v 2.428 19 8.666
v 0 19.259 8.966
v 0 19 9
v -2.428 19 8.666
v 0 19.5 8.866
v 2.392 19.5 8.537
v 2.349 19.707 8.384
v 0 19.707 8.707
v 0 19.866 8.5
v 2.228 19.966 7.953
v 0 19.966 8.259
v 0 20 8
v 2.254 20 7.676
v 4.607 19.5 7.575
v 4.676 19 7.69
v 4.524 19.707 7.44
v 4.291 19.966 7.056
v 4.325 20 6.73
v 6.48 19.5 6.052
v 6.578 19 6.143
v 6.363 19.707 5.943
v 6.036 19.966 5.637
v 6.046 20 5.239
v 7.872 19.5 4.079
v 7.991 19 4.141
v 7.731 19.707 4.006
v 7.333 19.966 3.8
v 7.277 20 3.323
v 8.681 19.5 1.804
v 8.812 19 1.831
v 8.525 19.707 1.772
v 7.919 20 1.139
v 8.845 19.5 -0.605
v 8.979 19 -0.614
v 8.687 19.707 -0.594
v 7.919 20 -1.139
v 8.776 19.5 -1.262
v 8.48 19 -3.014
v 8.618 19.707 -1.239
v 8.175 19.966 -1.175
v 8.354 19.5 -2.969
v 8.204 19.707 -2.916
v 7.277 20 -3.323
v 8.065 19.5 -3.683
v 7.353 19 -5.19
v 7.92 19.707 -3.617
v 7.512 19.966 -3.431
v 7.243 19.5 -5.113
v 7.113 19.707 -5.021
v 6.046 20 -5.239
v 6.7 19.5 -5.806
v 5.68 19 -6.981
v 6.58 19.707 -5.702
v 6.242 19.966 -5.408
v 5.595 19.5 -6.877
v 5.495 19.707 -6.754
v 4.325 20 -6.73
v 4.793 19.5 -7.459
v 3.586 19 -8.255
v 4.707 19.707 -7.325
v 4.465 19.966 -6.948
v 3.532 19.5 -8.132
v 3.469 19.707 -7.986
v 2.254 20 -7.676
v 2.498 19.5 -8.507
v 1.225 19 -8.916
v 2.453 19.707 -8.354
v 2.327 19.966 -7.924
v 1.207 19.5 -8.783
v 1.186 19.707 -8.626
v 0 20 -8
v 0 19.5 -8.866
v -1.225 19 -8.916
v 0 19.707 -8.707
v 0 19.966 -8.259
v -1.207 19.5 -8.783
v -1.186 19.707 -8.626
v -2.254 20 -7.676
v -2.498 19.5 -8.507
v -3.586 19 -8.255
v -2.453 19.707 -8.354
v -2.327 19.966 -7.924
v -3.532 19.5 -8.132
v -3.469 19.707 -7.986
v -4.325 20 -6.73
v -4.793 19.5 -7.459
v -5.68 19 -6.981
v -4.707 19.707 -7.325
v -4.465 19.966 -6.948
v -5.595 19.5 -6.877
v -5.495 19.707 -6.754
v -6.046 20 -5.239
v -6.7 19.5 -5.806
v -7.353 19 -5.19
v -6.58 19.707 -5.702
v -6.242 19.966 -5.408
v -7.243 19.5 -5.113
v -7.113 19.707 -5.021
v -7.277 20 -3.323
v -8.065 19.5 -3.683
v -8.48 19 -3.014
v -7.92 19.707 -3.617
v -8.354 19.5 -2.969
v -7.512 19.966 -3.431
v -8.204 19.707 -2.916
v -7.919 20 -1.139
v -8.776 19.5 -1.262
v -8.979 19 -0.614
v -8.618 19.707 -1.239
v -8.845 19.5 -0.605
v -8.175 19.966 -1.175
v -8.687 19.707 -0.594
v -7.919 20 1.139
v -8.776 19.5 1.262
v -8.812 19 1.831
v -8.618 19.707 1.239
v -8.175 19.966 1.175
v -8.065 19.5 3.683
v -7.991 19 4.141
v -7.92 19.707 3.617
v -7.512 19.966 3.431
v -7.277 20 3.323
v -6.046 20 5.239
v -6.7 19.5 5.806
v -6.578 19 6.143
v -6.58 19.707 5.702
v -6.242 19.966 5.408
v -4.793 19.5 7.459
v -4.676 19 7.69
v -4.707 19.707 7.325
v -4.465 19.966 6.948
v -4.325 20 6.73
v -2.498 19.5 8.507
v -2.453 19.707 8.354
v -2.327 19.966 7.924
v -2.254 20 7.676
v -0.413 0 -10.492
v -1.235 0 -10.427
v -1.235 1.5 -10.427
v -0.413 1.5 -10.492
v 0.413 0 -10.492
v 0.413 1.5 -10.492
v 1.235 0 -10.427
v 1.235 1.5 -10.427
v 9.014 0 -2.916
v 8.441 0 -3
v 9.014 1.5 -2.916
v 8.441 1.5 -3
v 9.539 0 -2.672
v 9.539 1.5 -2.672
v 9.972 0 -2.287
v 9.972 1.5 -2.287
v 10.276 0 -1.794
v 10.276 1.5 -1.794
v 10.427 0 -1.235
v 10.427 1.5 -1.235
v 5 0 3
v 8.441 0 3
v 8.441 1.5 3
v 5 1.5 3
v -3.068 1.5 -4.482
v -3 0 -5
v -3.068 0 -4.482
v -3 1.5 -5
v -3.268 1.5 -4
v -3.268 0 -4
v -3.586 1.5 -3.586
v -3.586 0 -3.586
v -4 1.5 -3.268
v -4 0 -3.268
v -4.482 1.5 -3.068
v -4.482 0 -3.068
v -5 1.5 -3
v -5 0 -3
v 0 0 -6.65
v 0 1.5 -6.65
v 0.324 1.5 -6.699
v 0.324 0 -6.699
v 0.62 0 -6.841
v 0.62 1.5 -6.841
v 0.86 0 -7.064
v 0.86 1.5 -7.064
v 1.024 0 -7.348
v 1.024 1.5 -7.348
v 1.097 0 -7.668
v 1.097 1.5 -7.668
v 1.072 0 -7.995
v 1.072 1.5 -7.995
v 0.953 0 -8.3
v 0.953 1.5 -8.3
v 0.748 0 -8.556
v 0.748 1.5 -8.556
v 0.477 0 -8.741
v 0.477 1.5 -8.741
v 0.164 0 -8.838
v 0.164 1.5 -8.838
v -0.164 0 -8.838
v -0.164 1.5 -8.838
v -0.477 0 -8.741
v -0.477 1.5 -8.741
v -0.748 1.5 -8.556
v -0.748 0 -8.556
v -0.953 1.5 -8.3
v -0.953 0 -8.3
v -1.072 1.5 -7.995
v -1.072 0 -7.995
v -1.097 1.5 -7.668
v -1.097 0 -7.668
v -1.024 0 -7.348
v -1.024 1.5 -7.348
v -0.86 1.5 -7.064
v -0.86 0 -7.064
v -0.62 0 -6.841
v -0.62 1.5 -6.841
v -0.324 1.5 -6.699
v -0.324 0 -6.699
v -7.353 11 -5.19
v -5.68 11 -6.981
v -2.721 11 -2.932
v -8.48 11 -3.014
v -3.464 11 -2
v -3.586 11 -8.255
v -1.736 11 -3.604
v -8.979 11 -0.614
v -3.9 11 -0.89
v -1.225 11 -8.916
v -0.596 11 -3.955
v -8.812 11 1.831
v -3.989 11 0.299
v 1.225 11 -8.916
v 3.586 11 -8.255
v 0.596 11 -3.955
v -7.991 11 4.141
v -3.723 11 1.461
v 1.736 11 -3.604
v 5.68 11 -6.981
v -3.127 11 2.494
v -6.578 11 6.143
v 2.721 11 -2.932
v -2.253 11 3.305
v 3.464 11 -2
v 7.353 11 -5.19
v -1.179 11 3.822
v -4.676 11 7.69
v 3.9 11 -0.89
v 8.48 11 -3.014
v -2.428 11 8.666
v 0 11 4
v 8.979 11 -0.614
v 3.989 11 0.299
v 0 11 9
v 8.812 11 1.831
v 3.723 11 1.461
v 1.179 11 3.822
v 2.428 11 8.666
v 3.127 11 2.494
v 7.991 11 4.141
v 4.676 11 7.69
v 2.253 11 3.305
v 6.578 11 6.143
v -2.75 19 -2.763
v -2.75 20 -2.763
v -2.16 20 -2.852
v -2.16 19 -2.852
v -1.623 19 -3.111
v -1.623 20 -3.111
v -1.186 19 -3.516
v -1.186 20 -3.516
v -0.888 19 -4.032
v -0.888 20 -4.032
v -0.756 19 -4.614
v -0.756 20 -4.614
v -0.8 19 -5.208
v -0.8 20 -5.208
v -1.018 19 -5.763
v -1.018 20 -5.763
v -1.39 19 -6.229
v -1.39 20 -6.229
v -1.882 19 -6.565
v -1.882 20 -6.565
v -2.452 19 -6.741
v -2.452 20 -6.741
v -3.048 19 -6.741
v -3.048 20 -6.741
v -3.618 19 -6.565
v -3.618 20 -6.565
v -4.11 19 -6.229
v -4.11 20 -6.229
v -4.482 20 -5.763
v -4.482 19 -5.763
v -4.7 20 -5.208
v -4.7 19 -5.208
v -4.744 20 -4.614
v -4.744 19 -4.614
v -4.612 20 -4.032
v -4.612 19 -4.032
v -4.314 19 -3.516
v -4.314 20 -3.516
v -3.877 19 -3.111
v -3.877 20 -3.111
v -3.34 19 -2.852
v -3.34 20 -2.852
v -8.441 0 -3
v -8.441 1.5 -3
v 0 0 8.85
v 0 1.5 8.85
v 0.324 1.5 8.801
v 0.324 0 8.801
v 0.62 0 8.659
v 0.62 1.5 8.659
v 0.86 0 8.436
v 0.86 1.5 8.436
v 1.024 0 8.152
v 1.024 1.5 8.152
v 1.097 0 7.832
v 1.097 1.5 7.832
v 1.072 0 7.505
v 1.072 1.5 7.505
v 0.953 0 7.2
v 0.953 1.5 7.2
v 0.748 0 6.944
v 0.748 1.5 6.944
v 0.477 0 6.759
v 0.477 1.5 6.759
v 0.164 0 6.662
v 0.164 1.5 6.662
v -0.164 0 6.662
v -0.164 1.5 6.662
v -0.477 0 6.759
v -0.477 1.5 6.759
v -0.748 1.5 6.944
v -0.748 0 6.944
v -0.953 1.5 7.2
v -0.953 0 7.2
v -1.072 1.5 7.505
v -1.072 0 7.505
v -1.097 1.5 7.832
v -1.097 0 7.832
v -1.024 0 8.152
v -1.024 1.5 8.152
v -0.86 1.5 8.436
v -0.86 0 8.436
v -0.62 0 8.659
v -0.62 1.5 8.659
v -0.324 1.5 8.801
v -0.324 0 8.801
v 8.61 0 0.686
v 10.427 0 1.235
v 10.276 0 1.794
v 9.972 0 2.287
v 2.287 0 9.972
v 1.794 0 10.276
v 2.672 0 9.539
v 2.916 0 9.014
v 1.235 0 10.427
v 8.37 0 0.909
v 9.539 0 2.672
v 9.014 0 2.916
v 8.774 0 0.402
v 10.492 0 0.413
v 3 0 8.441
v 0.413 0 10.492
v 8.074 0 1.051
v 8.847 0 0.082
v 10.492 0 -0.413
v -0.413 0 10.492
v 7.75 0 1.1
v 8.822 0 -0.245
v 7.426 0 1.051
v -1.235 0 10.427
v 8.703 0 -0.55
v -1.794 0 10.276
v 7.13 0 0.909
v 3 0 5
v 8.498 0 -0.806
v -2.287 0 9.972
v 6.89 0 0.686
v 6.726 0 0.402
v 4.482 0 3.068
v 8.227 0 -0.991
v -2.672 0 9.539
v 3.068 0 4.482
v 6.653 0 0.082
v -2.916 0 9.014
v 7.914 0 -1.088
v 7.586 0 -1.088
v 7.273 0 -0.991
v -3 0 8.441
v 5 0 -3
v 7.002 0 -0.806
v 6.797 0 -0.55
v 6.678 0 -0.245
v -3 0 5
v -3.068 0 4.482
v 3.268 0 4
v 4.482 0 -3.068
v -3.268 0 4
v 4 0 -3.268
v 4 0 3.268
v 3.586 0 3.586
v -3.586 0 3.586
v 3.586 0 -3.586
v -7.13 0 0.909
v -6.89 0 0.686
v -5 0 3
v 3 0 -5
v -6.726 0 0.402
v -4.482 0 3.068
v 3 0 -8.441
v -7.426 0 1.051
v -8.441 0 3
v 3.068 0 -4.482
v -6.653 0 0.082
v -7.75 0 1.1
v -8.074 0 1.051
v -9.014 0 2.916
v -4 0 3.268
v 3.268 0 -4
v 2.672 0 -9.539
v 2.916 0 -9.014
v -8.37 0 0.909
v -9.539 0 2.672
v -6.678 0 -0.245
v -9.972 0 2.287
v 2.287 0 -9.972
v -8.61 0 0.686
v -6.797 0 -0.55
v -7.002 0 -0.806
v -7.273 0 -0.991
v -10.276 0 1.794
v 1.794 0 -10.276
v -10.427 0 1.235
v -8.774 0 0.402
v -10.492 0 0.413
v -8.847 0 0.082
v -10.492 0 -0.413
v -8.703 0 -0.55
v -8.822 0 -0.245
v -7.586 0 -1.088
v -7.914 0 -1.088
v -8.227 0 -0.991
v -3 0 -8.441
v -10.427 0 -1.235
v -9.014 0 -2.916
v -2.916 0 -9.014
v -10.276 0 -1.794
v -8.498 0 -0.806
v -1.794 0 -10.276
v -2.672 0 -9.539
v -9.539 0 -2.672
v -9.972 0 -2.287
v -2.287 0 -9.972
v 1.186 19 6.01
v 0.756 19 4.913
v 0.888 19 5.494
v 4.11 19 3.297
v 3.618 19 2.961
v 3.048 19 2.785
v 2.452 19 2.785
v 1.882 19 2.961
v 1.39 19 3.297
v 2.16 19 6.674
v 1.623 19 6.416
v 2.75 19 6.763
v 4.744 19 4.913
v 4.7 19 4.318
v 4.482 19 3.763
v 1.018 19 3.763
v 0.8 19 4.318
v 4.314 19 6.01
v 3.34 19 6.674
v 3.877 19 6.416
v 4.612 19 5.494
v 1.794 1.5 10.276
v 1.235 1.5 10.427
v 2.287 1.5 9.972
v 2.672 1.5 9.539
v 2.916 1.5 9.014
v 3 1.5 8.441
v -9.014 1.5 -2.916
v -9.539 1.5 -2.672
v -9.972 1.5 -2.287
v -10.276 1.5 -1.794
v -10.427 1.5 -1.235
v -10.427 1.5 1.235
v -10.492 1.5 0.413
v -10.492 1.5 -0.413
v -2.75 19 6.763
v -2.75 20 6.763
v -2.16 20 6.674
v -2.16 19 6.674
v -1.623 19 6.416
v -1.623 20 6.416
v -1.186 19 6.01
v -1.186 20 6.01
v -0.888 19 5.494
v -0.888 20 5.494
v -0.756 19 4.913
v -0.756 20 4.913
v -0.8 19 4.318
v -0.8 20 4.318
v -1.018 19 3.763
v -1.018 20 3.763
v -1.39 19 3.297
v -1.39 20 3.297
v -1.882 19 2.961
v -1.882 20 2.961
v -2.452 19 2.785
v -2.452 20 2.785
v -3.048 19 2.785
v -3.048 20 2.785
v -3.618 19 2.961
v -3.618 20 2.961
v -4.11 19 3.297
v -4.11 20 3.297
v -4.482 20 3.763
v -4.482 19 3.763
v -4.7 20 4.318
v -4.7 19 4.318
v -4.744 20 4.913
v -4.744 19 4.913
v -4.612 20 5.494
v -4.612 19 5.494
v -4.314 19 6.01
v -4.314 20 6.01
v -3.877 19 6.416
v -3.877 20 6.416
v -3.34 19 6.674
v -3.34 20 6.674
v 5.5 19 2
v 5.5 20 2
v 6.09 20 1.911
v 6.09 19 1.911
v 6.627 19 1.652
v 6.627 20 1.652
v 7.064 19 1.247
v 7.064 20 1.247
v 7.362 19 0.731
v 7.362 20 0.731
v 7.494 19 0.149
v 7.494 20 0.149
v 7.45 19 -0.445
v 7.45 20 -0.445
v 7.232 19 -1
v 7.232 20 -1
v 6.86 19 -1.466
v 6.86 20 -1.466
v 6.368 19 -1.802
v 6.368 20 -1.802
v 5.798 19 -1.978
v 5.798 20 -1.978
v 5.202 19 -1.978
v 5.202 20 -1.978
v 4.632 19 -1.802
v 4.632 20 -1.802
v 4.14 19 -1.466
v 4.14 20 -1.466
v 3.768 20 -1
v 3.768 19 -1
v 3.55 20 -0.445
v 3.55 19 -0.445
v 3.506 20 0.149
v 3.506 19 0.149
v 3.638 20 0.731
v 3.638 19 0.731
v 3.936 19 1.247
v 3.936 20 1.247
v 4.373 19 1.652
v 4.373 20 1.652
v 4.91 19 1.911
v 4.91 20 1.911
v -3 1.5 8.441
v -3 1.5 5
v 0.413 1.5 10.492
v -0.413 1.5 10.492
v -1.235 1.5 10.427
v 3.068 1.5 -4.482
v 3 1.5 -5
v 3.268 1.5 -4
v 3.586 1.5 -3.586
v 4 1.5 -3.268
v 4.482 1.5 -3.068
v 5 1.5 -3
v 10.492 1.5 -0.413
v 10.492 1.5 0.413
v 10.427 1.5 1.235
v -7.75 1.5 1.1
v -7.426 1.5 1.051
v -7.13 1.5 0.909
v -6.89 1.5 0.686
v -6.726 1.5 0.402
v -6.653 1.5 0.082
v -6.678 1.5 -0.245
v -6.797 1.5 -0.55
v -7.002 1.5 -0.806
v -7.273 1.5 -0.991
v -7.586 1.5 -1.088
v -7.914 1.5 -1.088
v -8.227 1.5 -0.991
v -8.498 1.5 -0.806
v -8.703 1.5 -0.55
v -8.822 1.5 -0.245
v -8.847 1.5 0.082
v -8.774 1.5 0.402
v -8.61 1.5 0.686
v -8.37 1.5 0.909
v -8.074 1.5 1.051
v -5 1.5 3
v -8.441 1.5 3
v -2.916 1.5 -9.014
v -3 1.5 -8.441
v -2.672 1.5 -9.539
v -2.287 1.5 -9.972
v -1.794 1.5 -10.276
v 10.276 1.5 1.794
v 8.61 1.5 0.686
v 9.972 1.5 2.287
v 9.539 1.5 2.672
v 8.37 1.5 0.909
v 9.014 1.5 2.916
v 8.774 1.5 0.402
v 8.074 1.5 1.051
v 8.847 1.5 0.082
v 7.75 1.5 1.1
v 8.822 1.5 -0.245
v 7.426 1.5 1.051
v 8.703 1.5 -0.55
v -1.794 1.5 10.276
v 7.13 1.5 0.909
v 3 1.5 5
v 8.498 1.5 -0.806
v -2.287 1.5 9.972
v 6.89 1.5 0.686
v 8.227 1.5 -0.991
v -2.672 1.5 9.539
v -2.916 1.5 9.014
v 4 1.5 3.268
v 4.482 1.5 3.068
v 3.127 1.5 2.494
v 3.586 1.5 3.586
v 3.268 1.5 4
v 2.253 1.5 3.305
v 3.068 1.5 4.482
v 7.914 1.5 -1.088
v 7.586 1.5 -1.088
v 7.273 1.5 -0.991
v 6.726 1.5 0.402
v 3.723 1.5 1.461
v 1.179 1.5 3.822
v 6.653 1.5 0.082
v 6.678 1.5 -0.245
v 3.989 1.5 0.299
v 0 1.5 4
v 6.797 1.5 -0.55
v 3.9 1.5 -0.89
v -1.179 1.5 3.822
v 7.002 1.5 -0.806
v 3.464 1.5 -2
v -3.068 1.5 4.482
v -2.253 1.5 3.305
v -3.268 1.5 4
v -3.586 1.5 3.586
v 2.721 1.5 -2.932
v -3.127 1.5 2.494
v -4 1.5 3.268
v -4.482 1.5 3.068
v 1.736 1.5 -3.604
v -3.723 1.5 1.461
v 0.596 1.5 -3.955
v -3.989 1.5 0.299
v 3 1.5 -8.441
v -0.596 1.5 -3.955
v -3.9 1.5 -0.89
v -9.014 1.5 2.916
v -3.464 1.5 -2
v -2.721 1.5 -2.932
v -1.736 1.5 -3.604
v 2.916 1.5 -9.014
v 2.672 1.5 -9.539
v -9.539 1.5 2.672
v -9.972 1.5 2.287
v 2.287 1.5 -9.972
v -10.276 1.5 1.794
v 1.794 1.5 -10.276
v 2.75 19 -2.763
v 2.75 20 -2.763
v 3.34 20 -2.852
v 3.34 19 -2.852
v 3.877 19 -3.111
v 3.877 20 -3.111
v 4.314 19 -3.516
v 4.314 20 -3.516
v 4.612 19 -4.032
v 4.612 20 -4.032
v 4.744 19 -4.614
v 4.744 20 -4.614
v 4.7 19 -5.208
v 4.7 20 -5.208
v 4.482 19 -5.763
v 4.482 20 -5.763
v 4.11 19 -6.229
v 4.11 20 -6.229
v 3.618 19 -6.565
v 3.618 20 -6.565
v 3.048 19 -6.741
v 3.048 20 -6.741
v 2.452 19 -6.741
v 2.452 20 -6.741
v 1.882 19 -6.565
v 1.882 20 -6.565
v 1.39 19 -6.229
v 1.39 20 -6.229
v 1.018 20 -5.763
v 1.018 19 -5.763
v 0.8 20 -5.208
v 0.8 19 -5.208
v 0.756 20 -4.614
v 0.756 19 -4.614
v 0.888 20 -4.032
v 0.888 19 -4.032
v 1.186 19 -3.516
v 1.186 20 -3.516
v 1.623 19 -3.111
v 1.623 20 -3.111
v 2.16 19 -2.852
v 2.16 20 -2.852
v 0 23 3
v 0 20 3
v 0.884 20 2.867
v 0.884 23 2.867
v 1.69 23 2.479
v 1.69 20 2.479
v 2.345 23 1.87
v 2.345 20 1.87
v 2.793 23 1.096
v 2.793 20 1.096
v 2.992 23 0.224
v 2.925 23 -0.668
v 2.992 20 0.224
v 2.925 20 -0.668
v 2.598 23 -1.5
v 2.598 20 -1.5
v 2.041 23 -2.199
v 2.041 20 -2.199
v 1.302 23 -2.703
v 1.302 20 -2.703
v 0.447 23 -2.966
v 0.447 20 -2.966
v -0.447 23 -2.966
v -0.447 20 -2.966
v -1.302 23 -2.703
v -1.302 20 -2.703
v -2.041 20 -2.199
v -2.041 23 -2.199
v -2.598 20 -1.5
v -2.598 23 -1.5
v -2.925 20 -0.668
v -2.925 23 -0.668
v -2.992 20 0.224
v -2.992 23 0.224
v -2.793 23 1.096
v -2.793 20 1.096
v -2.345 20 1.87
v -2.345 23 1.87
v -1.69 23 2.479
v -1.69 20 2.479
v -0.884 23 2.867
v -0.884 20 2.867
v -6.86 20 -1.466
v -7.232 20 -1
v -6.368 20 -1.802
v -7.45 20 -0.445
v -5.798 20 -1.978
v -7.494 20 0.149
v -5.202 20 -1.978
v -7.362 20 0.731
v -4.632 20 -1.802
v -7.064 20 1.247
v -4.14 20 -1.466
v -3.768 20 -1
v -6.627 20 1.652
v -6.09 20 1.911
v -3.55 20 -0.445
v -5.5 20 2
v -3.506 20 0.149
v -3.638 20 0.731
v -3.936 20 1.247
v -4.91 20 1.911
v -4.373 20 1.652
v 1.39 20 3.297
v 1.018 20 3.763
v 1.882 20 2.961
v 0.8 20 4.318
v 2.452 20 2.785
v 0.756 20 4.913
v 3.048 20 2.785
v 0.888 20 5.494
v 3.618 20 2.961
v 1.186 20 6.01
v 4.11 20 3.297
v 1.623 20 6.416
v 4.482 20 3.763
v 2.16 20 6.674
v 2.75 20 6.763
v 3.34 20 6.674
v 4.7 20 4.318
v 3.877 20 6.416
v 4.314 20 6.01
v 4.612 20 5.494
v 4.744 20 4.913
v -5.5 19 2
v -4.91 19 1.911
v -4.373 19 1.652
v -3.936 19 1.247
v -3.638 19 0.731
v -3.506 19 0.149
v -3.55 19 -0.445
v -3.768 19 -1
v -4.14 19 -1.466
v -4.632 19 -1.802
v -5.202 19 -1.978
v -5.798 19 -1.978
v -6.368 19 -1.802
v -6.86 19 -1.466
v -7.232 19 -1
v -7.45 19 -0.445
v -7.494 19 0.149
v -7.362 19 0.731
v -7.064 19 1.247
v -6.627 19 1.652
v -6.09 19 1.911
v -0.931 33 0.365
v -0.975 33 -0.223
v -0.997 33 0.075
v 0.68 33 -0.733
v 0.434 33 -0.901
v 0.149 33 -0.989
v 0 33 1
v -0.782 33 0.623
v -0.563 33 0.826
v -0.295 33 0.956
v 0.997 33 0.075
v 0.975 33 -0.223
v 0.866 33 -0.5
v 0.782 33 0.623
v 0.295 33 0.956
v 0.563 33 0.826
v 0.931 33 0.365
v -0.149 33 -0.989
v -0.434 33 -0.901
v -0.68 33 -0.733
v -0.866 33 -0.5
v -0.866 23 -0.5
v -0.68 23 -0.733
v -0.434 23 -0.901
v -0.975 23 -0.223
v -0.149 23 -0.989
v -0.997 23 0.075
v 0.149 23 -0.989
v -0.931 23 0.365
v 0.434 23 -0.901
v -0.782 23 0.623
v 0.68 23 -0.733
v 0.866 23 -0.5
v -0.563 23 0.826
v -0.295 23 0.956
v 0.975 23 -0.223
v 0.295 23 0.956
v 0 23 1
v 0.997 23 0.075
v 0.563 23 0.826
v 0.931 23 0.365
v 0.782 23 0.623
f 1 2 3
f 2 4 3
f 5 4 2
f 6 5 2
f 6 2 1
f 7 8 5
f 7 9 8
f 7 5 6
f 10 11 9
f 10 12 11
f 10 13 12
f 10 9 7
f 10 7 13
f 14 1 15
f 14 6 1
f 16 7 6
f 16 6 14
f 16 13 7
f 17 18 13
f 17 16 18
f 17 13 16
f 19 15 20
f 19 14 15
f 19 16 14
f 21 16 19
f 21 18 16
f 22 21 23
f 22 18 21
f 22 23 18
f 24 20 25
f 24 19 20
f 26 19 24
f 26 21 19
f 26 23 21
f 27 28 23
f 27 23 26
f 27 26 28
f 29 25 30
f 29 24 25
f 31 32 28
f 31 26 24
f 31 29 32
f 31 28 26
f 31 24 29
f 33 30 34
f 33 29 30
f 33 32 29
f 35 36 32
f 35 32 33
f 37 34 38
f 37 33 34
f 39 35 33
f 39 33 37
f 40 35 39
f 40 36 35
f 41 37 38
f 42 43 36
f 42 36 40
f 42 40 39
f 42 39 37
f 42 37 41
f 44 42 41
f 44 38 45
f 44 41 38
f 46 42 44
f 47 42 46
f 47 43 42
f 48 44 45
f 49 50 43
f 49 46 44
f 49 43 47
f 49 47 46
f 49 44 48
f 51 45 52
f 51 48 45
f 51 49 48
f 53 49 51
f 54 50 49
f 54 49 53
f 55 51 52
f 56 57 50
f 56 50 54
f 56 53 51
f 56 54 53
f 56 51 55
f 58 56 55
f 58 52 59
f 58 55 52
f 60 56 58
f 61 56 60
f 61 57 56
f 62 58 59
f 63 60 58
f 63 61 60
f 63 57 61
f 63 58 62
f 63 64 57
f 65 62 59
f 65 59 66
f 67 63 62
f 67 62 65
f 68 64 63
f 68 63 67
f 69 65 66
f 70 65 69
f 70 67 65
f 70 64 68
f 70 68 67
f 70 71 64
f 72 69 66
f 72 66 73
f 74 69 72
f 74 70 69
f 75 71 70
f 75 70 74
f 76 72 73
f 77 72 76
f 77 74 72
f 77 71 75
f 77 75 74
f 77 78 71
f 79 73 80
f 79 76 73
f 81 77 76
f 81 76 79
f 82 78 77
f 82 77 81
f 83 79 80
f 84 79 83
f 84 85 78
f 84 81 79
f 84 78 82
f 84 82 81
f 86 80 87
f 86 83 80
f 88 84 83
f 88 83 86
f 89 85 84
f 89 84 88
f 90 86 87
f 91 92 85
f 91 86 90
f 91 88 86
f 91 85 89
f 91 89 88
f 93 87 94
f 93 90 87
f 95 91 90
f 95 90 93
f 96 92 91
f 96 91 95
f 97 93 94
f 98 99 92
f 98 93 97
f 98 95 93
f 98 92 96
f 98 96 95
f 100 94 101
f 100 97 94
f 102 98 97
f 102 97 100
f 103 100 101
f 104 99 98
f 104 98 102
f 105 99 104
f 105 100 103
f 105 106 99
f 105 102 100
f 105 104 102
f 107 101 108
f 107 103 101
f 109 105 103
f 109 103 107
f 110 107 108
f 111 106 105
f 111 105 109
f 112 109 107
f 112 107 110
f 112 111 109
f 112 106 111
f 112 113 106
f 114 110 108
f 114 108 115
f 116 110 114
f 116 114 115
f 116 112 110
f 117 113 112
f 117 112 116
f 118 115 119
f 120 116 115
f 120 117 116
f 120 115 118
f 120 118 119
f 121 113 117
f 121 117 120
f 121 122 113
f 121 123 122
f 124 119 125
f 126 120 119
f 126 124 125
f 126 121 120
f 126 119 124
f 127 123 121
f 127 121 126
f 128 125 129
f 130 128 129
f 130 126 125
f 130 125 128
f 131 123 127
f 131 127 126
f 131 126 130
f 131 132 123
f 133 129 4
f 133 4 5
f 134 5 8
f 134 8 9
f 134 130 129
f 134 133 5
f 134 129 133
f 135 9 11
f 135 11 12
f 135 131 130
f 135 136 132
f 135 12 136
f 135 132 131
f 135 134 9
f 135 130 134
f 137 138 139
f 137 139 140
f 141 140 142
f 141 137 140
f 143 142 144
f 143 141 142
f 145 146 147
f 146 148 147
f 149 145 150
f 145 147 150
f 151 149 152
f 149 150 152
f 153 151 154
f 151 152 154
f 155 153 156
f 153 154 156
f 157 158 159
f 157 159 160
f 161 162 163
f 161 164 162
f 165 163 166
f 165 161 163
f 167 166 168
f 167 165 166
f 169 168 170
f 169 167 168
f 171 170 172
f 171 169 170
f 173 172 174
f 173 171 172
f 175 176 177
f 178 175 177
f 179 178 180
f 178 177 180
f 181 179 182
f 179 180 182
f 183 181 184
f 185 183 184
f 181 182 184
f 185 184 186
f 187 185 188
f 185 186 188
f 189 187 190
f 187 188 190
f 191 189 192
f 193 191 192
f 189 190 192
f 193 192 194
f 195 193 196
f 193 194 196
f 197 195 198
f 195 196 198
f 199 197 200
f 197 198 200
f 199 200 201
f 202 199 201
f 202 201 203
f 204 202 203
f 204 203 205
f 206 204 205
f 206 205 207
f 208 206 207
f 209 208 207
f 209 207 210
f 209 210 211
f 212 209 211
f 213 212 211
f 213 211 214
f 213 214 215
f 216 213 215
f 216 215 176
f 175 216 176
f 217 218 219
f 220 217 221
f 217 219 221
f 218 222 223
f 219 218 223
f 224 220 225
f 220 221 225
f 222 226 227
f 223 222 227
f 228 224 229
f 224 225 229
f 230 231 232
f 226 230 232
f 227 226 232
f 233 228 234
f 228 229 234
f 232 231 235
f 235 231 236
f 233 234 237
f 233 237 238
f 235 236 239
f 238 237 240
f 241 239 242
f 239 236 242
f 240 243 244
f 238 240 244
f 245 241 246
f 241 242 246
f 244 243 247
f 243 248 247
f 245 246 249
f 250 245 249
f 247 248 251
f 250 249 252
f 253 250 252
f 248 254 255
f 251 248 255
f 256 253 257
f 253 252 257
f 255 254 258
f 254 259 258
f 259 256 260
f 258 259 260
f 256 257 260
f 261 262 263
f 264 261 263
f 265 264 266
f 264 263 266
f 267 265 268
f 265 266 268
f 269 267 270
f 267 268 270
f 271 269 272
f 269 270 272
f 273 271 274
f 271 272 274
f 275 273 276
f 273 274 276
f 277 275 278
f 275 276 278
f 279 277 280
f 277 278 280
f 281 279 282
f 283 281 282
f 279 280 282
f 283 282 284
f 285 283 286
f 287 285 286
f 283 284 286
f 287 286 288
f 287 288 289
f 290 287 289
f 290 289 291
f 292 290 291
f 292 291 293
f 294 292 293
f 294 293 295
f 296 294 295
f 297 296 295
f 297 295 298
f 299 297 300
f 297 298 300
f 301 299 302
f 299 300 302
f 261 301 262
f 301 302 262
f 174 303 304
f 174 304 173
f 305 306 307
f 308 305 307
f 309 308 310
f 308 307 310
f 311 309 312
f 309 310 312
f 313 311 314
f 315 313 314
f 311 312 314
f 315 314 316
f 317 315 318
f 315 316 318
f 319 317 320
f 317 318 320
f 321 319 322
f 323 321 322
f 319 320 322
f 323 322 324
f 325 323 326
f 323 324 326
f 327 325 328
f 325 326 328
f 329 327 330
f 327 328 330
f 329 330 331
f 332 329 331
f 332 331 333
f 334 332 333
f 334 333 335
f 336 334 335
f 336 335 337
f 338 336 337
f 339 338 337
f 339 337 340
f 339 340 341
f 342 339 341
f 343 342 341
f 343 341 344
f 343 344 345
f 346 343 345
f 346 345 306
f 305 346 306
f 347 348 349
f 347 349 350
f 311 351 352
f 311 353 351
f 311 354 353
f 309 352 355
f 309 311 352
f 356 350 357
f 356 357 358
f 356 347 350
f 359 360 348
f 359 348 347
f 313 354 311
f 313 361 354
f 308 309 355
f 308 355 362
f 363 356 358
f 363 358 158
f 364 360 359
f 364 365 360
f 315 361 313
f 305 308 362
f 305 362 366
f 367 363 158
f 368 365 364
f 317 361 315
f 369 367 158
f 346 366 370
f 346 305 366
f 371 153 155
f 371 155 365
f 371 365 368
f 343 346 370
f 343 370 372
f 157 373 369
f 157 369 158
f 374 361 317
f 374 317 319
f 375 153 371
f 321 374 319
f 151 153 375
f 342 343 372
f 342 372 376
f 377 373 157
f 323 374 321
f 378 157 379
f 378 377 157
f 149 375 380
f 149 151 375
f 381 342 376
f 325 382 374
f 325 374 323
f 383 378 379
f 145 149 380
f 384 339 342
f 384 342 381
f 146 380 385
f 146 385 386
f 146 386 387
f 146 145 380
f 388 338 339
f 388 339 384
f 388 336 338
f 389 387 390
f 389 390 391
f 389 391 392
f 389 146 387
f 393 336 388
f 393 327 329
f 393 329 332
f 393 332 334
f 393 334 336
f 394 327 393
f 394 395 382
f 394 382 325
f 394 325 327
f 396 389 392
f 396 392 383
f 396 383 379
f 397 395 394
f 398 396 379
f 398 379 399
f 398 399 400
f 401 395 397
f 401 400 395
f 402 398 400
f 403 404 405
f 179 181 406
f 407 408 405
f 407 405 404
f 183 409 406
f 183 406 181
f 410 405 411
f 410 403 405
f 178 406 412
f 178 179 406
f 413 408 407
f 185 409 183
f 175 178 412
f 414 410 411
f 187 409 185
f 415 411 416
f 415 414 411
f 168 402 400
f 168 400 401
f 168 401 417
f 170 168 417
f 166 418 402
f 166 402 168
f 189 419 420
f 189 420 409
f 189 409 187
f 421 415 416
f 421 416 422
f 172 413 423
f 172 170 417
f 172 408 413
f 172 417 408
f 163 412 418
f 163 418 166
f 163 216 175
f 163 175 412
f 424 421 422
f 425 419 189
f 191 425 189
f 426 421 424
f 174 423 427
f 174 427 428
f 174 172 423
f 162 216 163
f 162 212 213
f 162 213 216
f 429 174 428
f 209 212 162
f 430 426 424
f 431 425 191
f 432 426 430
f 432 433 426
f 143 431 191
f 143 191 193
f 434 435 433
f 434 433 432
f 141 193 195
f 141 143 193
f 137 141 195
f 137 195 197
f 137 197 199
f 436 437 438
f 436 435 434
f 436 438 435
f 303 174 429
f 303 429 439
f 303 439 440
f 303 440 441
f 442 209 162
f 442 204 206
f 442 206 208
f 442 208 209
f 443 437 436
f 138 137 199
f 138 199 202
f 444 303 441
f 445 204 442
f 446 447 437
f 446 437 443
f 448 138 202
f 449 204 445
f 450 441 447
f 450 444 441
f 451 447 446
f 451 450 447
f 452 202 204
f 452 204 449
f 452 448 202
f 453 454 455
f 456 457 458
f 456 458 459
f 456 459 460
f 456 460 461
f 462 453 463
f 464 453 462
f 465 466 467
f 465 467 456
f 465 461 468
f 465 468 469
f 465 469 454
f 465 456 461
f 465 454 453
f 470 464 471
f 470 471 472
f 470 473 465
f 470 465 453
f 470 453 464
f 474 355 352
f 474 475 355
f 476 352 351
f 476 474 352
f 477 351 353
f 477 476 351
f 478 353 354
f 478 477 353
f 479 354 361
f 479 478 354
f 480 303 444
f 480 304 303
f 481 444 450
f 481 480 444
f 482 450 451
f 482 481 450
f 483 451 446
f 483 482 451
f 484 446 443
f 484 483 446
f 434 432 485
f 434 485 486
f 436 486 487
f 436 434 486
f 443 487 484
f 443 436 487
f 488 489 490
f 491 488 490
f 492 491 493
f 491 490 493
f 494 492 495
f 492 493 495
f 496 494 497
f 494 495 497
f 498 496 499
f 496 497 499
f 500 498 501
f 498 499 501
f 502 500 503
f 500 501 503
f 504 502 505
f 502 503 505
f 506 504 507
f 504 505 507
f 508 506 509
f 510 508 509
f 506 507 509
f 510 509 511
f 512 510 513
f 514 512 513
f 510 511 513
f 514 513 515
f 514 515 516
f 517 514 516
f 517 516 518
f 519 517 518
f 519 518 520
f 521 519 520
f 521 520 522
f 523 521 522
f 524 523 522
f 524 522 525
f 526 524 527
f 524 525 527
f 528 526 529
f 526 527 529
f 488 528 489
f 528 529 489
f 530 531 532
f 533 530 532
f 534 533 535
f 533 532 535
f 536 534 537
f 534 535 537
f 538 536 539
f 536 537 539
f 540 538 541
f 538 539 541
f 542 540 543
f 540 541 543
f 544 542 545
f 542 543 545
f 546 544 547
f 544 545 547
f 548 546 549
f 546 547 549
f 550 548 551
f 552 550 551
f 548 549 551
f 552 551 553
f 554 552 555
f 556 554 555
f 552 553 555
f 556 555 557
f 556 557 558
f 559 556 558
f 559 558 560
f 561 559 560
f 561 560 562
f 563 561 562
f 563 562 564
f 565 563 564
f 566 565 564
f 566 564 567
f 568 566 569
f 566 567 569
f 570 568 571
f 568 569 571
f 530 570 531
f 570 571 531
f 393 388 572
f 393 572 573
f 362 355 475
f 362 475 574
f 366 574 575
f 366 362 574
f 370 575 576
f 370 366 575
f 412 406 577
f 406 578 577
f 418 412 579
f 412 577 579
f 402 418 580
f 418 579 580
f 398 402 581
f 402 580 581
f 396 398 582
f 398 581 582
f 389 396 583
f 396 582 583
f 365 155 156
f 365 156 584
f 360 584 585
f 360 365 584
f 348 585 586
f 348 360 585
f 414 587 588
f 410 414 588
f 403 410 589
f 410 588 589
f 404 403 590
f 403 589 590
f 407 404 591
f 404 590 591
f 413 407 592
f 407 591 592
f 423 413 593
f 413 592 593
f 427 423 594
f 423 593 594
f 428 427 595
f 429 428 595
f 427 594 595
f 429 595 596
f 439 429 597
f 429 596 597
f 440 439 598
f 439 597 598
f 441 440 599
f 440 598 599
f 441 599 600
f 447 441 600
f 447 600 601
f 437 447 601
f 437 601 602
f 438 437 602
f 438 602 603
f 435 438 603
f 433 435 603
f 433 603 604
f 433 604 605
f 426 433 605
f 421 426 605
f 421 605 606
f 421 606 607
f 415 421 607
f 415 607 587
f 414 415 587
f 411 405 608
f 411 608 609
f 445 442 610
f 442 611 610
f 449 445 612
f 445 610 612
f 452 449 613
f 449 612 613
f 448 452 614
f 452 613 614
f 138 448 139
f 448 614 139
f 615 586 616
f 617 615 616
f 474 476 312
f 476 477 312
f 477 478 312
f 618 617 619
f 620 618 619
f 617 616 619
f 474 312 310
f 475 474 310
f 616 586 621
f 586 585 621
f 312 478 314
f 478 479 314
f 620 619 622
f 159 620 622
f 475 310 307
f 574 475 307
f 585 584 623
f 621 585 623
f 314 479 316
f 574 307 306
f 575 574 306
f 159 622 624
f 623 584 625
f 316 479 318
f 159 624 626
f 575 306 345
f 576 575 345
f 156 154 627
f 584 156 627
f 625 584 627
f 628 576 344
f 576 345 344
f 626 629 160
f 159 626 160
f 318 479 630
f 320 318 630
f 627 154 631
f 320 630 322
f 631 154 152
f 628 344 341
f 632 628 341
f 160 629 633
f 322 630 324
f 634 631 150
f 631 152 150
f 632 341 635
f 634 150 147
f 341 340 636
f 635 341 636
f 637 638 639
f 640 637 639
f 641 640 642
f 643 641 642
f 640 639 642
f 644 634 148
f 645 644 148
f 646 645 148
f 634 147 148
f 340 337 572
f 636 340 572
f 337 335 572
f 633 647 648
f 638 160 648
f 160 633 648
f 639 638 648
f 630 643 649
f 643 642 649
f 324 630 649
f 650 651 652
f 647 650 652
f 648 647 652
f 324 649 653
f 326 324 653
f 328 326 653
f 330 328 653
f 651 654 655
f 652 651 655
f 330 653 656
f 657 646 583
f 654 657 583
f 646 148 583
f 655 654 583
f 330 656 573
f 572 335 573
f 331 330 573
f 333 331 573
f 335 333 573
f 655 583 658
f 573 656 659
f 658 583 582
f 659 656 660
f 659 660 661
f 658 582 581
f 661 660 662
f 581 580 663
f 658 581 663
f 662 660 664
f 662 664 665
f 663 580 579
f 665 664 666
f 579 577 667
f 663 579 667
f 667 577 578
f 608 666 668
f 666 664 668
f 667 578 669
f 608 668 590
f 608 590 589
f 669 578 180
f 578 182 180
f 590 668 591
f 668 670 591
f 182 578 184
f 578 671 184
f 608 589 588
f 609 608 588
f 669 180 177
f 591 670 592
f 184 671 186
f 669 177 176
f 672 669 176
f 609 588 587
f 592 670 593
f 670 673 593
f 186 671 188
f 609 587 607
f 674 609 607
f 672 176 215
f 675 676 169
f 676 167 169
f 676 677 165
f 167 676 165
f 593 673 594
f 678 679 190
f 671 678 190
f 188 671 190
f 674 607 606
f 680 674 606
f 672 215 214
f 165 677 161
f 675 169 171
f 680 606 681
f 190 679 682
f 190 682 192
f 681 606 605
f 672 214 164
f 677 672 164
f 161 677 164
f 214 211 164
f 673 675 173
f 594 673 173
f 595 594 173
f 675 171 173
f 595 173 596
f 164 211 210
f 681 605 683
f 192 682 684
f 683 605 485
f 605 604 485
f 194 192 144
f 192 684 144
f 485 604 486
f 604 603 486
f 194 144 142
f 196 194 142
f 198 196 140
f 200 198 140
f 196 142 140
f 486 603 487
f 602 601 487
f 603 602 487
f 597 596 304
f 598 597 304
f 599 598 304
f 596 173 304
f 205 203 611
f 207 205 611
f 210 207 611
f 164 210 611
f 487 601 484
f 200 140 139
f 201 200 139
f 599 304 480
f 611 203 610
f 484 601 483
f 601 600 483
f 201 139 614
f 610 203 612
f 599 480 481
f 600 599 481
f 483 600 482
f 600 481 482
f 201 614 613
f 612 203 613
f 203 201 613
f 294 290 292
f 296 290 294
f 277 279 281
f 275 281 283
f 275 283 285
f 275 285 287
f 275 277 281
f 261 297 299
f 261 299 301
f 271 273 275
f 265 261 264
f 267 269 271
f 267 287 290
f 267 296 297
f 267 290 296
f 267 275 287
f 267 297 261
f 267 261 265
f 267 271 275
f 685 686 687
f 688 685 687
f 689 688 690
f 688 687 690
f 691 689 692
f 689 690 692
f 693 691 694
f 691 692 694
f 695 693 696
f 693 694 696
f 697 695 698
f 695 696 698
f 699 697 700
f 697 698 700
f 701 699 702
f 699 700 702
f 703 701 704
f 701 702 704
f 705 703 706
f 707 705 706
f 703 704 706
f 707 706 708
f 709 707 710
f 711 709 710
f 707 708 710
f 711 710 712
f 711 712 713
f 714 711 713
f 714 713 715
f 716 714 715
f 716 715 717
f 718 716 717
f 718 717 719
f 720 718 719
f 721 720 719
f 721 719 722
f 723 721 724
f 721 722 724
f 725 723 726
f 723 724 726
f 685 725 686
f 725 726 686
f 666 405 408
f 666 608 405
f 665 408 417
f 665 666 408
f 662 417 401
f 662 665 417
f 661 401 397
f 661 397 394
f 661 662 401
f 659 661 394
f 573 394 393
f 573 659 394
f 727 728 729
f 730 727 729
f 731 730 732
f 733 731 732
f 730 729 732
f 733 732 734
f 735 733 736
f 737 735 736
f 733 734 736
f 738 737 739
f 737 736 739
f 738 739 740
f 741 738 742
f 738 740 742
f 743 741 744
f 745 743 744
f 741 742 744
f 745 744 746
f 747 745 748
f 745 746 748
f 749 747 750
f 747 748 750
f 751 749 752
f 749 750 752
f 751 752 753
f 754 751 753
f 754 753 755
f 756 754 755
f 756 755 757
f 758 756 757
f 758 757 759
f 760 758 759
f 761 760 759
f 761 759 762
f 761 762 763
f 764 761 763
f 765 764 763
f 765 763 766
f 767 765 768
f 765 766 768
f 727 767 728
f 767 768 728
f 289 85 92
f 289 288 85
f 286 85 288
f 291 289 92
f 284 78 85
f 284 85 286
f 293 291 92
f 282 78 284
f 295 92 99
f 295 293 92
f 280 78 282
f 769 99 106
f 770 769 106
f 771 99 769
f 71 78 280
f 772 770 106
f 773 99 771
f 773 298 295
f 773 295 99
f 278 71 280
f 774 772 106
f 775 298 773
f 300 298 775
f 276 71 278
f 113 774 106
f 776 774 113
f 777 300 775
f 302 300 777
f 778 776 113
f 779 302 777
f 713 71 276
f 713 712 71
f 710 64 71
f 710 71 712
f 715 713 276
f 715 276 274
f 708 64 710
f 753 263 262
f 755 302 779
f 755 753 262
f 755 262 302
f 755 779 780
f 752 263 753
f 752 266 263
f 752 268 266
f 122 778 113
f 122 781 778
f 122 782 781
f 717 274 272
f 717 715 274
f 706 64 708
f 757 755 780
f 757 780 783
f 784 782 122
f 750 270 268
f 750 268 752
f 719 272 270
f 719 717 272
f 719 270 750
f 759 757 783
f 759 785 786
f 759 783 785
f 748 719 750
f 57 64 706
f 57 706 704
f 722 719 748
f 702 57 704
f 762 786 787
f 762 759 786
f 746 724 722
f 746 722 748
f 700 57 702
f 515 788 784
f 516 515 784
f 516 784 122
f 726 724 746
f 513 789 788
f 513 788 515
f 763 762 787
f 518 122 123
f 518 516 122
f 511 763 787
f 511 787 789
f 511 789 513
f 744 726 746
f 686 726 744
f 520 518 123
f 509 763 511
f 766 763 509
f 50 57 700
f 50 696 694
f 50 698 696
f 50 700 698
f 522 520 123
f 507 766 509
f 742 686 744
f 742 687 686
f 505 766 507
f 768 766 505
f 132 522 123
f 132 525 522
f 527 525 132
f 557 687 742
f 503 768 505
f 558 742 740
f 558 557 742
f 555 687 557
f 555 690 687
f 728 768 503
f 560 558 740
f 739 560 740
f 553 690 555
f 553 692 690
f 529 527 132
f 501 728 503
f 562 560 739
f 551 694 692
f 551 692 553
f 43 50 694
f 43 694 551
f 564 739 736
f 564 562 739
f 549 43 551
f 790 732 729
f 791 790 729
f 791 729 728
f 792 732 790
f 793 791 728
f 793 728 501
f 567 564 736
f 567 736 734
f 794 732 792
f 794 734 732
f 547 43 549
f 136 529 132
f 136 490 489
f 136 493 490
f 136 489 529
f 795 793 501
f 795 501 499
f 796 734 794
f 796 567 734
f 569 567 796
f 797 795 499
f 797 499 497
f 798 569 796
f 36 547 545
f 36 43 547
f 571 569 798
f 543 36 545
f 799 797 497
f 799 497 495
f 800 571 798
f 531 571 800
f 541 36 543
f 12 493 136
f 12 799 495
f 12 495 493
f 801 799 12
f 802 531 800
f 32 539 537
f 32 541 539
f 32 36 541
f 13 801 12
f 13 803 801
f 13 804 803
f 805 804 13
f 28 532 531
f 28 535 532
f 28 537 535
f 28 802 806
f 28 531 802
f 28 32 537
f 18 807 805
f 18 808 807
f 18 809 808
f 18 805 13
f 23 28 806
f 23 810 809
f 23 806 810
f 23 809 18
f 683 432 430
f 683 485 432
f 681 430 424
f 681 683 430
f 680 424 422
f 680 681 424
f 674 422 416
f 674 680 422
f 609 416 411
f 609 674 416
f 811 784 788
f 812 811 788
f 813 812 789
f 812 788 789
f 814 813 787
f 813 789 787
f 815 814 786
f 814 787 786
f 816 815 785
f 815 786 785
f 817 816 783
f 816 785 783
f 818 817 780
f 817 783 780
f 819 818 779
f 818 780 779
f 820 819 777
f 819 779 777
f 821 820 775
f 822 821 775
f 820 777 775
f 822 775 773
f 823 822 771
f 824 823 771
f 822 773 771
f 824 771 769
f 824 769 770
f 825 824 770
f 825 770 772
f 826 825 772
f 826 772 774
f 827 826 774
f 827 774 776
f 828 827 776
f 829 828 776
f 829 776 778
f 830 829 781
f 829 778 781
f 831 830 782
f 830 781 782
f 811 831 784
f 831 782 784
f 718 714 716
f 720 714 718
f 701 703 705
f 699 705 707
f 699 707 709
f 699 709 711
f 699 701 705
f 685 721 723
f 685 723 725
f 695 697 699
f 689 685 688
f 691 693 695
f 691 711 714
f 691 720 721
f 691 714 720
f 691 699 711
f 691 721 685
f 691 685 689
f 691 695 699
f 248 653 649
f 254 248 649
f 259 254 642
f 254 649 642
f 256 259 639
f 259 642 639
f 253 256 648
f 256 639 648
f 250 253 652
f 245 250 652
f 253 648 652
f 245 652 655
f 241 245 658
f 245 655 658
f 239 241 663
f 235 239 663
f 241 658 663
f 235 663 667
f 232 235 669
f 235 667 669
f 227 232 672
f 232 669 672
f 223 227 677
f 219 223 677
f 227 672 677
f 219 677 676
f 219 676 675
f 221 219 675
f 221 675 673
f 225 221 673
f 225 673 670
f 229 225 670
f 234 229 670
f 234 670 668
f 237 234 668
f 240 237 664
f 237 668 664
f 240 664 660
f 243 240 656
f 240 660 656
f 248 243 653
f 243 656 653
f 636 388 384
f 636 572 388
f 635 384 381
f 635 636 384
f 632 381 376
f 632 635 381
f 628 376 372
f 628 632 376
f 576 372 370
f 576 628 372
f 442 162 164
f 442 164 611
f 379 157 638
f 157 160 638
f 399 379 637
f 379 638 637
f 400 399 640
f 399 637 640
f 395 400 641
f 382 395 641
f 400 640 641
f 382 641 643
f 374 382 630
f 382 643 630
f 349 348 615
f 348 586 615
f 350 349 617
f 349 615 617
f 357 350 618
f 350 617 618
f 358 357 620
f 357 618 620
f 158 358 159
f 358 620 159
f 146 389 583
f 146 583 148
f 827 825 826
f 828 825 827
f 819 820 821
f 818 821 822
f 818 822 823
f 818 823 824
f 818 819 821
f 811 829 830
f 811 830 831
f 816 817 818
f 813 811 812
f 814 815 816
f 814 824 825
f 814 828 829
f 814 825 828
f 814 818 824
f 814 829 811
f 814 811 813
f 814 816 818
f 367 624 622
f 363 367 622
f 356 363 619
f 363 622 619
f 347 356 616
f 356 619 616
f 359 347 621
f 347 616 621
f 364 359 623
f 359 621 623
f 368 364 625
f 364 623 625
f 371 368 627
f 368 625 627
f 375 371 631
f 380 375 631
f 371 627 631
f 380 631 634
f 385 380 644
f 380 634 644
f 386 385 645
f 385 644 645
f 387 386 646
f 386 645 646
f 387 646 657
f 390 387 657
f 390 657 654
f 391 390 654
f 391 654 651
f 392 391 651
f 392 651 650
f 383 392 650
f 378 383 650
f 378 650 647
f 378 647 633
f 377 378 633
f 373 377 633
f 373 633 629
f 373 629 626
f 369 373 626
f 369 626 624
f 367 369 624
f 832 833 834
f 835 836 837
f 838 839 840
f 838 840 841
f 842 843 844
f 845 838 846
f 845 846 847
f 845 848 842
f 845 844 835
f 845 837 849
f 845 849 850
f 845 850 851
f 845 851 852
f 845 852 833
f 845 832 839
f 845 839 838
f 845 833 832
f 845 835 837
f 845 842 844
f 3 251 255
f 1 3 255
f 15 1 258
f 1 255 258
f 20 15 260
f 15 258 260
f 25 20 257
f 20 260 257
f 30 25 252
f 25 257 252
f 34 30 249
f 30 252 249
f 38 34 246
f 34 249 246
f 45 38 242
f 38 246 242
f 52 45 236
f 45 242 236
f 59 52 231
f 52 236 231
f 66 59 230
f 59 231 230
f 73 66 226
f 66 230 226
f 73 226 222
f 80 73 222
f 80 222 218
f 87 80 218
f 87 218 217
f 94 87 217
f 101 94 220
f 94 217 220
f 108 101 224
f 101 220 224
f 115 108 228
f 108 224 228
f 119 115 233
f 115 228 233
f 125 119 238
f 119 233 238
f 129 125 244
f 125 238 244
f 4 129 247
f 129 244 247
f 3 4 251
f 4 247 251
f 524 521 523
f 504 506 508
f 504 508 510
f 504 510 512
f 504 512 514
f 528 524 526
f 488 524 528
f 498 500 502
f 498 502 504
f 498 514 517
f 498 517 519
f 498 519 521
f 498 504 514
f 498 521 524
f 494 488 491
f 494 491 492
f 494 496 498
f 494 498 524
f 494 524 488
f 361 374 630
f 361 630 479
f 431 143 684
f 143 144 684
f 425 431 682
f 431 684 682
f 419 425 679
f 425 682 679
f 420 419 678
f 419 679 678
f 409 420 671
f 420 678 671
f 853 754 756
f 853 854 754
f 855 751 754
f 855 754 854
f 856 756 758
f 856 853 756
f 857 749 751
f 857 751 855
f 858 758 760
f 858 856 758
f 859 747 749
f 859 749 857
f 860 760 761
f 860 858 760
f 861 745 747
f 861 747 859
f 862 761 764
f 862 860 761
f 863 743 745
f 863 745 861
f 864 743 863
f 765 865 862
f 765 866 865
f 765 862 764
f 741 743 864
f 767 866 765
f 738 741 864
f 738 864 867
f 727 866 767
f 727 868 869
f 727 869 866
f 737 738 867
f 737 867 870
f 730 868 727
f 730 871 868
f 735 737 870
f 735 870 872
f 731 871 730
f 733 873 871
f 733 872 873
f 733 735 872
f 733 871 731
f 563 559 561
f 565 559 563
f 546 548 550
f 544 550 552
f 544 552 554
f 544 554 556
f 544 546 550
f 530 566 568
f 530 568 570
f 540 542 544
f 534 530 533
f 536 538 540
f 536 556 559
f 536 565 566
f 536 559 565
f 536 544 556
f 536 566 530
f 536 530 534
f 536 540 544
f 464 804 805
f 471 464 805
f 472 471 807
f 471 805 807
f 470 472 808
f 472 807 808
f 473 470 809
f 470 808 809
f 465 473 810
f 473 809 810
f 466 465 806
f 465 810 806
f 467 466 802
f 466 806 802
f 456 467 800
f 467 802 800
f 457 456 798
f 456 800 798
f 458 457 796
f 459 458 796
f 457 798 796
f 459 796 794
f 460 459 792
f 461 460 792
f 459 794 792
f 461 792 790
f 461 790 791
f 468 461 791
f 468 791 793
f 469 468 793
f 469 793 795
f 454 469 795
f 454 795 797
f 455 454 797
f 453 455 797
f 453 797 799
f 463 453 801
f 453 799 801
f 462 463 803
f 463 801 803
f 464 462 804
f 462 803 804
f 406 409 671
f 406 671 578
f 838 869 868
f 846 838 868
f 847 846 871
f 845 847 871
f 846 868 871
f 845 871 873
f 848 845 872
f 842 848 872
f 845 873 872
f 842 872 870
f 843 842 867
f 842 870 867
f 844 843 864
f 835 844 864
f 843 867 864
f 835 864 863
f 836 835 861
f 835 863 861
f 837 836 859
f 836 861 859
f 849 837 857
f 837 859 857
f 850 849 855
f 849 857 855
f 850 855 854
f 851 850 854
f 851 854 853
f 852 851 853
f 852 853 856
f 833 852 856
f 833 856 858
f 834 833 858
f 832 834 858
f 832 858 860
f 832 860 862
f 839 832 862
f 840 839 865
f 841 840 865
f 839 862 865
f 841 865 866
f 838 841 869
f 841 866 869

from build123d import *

# Parameters (mm, degrees)
RESSALTO_EXTRUS_O1_DEPTH = 1.5
CORTE_EXTRUS_O1_REACH    = 16.925
ESBO_O2_R                = 1.1
FILETE1_R                = 2
ESBO_O3_R                = 4
RESSALTO_EXTRUS_O2_DEPTH = 9.5
ESBO_O4_R                = 9
RESSALTO_EXTRUS_O3_DEPTH = 9
FILETE2_R                = 1
ESBO_O5_R                = 3
RESSALTO_EXTRUS_O4_DEPTH = 3
ESBO_O6_R                = 1
RESSALTO_EXTRUS_O5_DEPTH = 10
ESBO_O7_R                = 2
CORTE_EXTRUS_O2_DEPTH    = 1


with BuildPart() as part:
    # Esboço1 → Ressalto-extrusão1 (new body)
    with BuildSketch(Plane(origin=(0, 0, 0), x_dir=(1, 0, 0), z_dir=(0, 1, 0))):
        with BuildLine():
            Line((-3, 3), (-3, 10.062305899))
            ThreePointArc((-3, 10.062305899), (0, 10.5), (3, 10.062305899))
            Line((3, 10.062305899), (3, 3))
            Line((3, 3), (10.062305899, 3))
            ThreePointArc((10.062305899, 3), (10.5, 0), (10.062305899, -3))
            Line((10.062305899, -3), (3, -3))
            Line((3, -3), (3, -10.062305899))
            ThreePointArc((3, -10.062305899), (0, -10.5), (-3, -10.062305899))
            Line((-3, -10.062305899), (-3, -3))
            Line((-3, -3), (-10.062305899, -3))
            ThreePointArc((-10.062305899, -3), (-10.5, 0), (-10.062305899, 3))
            Line((-10.062305899, 3), (-3, 3))
        make_face()
    extrude(amount=RESSALTO_EXTRUS_O1_DEPTH)

    # Esboço2 → Corte-extrusão1 (cut, up to next)
    with BuildSketch(Plane(origin=(0, 1.5, 0), x_dir=(1, 0, 0), z_dir=(0, 1, 0)), mode=Mode.PRIVATE) as corte_extrus_o1_sk1:
        with Locations(Location((-7.75, 0, 0), (0, 0, 270))):
            Circle(ESBO_O2_R)
    corte_extrus_o1_tool1 = extrude(corte_extrus_o1_sk1.sketch, amount=-CORTE_EXTRUS_O1_REACH, mode=Mode.PRIVATE) & part.part
    # Esboço2 → Corte-extrusão1 (cut, up to next)
    with BuildSketch(Plane(origin=(0, 1.5, 0), x_dir=(1, 0, 0), z_dir=(0, 1, 0)), mode=Mode.PRIVATE) as corte_extrus_o1_sk2:
        with Locations(Location((0, 7.75, 0), (0, 0, 270))):
            Circle(ESBO_O2_R)
    corte_extrus_o1_tool2 = extrude(corte_extrus_o1_sk2.sketch, amount=-CORTE_EXTRUS_O1_REACH, mode=Mode.PRIVATE) & part.part
    # Esboço2 → Corte-extrusão1 (cut, up to next)
    with BuildSketch(Plane(origin=(0, 1.5, 0), x_dir=(1, 0, 0), z_dir=(0, 1, 0)), mode=Mode.PRIVATE) as corte_extrus_o1_sk3:
        with Locations(Location((7.75, 0, 0), (0, 0, 270))):
            Circle(ESBO_O2_R)
    corte_extrus_o1_tool3 = extrude(corte_extrus_o1_sk3.sketch, amount=-CORTE_EXTRUS_O1_REACH, mode=Mode.PRIVATE) & part.part
    # Esboço2 → Corte-extrusão1 (cut, up to next)
    with BuildSketch(Plane(origin=(0, 1.5, 0), x_dir=(1, 0, 0), z_dir=(0, 1, 0)), mode=Mode.PRIVATE) as corte_extrus_o1_sk4:
        with Locations(Location((0, -7.75, 0), (0, 0, 270))):
            Circle(ESBO_O2_R)
    corte_extrus_o1_tool4 = extrude(corte_extrus_o1_sk4.sketch, amount=-CORTE_EXTRUS_O1_REACH, mode=Mode.PRIVATE) & part.part
    add(corte_extrus_o1_tool1.solids().sort_by_distance((-7.75, 1.5, 0))[0], mode=Mode.SUBTRACT)
    add(corte_extrus_o1_tool2.solids().sort_by_distance((0, 1.5, -7.75))[0], mode=Mode.SUBTRACT)
    add(corte_extrus_o1_tool3.solids().sort_by_distance((7.75, 1.5, 0))[0], mode=Mode.SUBTRACT)
    add(corte_extrus_o1_tool4.solids().sort_by_distance((0, 1.5, 7.75))[0], mode=Mode.SUBTRACT)

    # Filete1
    filete1_edges = [part.edges().sort_by_distance(p)[0] for p in [
        (10.062305899, 0.75, 3),
        (3, 0.75, 3),
        (3, 0.75, 10.062305899),
        (-3, 0.75, 10.062305899),
        (-3, 0.75, 3),
        (-10.062305899, 0.75, 3),
        (-10.062305899, 0.75, -3),
        (-3, 0.75, -3),
        (-3, 0.75, -10.062305899),
        (3, 0.75, -10.062305899),
        (3, 0.75, -3),
        (10.062305899, 0.75, -3),
    ]]
    fillet(filete1_edges, radius=FILETE1_R)

    # Esboço3 → Ressalto-extrusão2 (add)
    with BuildSketch(Plane(origin=(0, 1.5, 0), x_dir=(1, 0, 0), z_dir=(0, 1, 0))):
        with Locations(Location((0, 0, 0), (0, 0, 270))):
            Circle(ESBO_O3_R)
    extrude(amount=RESSALTO_EXTRUS_O2_DEPTH)

    # Esboço4 → Ressalto-extrusão3 (add)
    with BuildSketch(Plane(origin=(0, 11, 0), x_dir=(1, 0, 0), z_dir=(0, 1, 0))):
        with Locations(Location((0, 0, 0), (0, 0, 270))):
            Circle(ESBO_O4_R)
    extrude(amount=RESSALTO_EXTRUS_O3_DEPTH)

    # Filete2
    filete2_edges = [part.edges().sort_by_distance(p)[0] for p in [
        (0, 20, -9),
    ]]
    fillet(filete2_edges, radius=FILETE2_R)

    # Esboço5 → Ressalto-extrusão4 (add)
    with BuildSketch(Plane(origin=(0, 20, 0), x_dir=(1, 0, 0), z_dir=(0, 1, 0))):
        with Locations(Location((0, 0, 0), (0, 0, 270))):
            Circle(ESBO_O5_R)
    extrude(amount=RESSALTO_EXTRUS_O4_DEPTH)

    # Esboço6 → Ressalto-extrusão5 (add)
    with BuildSketch(Plane(origin=(0, 23, 0), x_dir=(1, 0, 0), z_dir=(0, 1, 0))):
        with Locations(Location((0, 0, 0), (0, 0, 270))):
            Circle(ESBO_O6_R)
    extrude(amount=RESSALTO_EXTRUS_O5_DEPTH)

    # Esboço7 → Corte-extrusão2 (cut)
    with BuildSketch(Plane(origin=(0, 20, 0), x_dir=(1, 0, 0), z_dir=(0, 1, 0))):
        with Locations(Location((-5.5, 0, 0), (0, 0, 270))):
            Circle(ESBO_O7_R)
        with Locations(Location((-2.75, 4.763139721, 0), (0, 0, 270))):
            Circle(ESBO_O7_R)
        with Locations(Location((2.75, 4.763139721, 0), (0, 0, 270))):
            Circle(ESBO_O7_R)
        with Locations(Location((5.5, 0, 0), (0, 0, 270))):
            Circle(ESBO_O7_R)
        with Locations(Location((2.75, -4.763139721, 0), (0, 0, 270))):
            Circle(ESBO_O7_R)
        with Locations(Location((-2.75, -4.763139721, 0), (0, 0, 270))):
            Circle(ESBO_O7_R)
    extrude(amount=-CORTE_EXTRUS_O2_DEPTH, mode=Mode.SUBTRACT)


solid = part.part
